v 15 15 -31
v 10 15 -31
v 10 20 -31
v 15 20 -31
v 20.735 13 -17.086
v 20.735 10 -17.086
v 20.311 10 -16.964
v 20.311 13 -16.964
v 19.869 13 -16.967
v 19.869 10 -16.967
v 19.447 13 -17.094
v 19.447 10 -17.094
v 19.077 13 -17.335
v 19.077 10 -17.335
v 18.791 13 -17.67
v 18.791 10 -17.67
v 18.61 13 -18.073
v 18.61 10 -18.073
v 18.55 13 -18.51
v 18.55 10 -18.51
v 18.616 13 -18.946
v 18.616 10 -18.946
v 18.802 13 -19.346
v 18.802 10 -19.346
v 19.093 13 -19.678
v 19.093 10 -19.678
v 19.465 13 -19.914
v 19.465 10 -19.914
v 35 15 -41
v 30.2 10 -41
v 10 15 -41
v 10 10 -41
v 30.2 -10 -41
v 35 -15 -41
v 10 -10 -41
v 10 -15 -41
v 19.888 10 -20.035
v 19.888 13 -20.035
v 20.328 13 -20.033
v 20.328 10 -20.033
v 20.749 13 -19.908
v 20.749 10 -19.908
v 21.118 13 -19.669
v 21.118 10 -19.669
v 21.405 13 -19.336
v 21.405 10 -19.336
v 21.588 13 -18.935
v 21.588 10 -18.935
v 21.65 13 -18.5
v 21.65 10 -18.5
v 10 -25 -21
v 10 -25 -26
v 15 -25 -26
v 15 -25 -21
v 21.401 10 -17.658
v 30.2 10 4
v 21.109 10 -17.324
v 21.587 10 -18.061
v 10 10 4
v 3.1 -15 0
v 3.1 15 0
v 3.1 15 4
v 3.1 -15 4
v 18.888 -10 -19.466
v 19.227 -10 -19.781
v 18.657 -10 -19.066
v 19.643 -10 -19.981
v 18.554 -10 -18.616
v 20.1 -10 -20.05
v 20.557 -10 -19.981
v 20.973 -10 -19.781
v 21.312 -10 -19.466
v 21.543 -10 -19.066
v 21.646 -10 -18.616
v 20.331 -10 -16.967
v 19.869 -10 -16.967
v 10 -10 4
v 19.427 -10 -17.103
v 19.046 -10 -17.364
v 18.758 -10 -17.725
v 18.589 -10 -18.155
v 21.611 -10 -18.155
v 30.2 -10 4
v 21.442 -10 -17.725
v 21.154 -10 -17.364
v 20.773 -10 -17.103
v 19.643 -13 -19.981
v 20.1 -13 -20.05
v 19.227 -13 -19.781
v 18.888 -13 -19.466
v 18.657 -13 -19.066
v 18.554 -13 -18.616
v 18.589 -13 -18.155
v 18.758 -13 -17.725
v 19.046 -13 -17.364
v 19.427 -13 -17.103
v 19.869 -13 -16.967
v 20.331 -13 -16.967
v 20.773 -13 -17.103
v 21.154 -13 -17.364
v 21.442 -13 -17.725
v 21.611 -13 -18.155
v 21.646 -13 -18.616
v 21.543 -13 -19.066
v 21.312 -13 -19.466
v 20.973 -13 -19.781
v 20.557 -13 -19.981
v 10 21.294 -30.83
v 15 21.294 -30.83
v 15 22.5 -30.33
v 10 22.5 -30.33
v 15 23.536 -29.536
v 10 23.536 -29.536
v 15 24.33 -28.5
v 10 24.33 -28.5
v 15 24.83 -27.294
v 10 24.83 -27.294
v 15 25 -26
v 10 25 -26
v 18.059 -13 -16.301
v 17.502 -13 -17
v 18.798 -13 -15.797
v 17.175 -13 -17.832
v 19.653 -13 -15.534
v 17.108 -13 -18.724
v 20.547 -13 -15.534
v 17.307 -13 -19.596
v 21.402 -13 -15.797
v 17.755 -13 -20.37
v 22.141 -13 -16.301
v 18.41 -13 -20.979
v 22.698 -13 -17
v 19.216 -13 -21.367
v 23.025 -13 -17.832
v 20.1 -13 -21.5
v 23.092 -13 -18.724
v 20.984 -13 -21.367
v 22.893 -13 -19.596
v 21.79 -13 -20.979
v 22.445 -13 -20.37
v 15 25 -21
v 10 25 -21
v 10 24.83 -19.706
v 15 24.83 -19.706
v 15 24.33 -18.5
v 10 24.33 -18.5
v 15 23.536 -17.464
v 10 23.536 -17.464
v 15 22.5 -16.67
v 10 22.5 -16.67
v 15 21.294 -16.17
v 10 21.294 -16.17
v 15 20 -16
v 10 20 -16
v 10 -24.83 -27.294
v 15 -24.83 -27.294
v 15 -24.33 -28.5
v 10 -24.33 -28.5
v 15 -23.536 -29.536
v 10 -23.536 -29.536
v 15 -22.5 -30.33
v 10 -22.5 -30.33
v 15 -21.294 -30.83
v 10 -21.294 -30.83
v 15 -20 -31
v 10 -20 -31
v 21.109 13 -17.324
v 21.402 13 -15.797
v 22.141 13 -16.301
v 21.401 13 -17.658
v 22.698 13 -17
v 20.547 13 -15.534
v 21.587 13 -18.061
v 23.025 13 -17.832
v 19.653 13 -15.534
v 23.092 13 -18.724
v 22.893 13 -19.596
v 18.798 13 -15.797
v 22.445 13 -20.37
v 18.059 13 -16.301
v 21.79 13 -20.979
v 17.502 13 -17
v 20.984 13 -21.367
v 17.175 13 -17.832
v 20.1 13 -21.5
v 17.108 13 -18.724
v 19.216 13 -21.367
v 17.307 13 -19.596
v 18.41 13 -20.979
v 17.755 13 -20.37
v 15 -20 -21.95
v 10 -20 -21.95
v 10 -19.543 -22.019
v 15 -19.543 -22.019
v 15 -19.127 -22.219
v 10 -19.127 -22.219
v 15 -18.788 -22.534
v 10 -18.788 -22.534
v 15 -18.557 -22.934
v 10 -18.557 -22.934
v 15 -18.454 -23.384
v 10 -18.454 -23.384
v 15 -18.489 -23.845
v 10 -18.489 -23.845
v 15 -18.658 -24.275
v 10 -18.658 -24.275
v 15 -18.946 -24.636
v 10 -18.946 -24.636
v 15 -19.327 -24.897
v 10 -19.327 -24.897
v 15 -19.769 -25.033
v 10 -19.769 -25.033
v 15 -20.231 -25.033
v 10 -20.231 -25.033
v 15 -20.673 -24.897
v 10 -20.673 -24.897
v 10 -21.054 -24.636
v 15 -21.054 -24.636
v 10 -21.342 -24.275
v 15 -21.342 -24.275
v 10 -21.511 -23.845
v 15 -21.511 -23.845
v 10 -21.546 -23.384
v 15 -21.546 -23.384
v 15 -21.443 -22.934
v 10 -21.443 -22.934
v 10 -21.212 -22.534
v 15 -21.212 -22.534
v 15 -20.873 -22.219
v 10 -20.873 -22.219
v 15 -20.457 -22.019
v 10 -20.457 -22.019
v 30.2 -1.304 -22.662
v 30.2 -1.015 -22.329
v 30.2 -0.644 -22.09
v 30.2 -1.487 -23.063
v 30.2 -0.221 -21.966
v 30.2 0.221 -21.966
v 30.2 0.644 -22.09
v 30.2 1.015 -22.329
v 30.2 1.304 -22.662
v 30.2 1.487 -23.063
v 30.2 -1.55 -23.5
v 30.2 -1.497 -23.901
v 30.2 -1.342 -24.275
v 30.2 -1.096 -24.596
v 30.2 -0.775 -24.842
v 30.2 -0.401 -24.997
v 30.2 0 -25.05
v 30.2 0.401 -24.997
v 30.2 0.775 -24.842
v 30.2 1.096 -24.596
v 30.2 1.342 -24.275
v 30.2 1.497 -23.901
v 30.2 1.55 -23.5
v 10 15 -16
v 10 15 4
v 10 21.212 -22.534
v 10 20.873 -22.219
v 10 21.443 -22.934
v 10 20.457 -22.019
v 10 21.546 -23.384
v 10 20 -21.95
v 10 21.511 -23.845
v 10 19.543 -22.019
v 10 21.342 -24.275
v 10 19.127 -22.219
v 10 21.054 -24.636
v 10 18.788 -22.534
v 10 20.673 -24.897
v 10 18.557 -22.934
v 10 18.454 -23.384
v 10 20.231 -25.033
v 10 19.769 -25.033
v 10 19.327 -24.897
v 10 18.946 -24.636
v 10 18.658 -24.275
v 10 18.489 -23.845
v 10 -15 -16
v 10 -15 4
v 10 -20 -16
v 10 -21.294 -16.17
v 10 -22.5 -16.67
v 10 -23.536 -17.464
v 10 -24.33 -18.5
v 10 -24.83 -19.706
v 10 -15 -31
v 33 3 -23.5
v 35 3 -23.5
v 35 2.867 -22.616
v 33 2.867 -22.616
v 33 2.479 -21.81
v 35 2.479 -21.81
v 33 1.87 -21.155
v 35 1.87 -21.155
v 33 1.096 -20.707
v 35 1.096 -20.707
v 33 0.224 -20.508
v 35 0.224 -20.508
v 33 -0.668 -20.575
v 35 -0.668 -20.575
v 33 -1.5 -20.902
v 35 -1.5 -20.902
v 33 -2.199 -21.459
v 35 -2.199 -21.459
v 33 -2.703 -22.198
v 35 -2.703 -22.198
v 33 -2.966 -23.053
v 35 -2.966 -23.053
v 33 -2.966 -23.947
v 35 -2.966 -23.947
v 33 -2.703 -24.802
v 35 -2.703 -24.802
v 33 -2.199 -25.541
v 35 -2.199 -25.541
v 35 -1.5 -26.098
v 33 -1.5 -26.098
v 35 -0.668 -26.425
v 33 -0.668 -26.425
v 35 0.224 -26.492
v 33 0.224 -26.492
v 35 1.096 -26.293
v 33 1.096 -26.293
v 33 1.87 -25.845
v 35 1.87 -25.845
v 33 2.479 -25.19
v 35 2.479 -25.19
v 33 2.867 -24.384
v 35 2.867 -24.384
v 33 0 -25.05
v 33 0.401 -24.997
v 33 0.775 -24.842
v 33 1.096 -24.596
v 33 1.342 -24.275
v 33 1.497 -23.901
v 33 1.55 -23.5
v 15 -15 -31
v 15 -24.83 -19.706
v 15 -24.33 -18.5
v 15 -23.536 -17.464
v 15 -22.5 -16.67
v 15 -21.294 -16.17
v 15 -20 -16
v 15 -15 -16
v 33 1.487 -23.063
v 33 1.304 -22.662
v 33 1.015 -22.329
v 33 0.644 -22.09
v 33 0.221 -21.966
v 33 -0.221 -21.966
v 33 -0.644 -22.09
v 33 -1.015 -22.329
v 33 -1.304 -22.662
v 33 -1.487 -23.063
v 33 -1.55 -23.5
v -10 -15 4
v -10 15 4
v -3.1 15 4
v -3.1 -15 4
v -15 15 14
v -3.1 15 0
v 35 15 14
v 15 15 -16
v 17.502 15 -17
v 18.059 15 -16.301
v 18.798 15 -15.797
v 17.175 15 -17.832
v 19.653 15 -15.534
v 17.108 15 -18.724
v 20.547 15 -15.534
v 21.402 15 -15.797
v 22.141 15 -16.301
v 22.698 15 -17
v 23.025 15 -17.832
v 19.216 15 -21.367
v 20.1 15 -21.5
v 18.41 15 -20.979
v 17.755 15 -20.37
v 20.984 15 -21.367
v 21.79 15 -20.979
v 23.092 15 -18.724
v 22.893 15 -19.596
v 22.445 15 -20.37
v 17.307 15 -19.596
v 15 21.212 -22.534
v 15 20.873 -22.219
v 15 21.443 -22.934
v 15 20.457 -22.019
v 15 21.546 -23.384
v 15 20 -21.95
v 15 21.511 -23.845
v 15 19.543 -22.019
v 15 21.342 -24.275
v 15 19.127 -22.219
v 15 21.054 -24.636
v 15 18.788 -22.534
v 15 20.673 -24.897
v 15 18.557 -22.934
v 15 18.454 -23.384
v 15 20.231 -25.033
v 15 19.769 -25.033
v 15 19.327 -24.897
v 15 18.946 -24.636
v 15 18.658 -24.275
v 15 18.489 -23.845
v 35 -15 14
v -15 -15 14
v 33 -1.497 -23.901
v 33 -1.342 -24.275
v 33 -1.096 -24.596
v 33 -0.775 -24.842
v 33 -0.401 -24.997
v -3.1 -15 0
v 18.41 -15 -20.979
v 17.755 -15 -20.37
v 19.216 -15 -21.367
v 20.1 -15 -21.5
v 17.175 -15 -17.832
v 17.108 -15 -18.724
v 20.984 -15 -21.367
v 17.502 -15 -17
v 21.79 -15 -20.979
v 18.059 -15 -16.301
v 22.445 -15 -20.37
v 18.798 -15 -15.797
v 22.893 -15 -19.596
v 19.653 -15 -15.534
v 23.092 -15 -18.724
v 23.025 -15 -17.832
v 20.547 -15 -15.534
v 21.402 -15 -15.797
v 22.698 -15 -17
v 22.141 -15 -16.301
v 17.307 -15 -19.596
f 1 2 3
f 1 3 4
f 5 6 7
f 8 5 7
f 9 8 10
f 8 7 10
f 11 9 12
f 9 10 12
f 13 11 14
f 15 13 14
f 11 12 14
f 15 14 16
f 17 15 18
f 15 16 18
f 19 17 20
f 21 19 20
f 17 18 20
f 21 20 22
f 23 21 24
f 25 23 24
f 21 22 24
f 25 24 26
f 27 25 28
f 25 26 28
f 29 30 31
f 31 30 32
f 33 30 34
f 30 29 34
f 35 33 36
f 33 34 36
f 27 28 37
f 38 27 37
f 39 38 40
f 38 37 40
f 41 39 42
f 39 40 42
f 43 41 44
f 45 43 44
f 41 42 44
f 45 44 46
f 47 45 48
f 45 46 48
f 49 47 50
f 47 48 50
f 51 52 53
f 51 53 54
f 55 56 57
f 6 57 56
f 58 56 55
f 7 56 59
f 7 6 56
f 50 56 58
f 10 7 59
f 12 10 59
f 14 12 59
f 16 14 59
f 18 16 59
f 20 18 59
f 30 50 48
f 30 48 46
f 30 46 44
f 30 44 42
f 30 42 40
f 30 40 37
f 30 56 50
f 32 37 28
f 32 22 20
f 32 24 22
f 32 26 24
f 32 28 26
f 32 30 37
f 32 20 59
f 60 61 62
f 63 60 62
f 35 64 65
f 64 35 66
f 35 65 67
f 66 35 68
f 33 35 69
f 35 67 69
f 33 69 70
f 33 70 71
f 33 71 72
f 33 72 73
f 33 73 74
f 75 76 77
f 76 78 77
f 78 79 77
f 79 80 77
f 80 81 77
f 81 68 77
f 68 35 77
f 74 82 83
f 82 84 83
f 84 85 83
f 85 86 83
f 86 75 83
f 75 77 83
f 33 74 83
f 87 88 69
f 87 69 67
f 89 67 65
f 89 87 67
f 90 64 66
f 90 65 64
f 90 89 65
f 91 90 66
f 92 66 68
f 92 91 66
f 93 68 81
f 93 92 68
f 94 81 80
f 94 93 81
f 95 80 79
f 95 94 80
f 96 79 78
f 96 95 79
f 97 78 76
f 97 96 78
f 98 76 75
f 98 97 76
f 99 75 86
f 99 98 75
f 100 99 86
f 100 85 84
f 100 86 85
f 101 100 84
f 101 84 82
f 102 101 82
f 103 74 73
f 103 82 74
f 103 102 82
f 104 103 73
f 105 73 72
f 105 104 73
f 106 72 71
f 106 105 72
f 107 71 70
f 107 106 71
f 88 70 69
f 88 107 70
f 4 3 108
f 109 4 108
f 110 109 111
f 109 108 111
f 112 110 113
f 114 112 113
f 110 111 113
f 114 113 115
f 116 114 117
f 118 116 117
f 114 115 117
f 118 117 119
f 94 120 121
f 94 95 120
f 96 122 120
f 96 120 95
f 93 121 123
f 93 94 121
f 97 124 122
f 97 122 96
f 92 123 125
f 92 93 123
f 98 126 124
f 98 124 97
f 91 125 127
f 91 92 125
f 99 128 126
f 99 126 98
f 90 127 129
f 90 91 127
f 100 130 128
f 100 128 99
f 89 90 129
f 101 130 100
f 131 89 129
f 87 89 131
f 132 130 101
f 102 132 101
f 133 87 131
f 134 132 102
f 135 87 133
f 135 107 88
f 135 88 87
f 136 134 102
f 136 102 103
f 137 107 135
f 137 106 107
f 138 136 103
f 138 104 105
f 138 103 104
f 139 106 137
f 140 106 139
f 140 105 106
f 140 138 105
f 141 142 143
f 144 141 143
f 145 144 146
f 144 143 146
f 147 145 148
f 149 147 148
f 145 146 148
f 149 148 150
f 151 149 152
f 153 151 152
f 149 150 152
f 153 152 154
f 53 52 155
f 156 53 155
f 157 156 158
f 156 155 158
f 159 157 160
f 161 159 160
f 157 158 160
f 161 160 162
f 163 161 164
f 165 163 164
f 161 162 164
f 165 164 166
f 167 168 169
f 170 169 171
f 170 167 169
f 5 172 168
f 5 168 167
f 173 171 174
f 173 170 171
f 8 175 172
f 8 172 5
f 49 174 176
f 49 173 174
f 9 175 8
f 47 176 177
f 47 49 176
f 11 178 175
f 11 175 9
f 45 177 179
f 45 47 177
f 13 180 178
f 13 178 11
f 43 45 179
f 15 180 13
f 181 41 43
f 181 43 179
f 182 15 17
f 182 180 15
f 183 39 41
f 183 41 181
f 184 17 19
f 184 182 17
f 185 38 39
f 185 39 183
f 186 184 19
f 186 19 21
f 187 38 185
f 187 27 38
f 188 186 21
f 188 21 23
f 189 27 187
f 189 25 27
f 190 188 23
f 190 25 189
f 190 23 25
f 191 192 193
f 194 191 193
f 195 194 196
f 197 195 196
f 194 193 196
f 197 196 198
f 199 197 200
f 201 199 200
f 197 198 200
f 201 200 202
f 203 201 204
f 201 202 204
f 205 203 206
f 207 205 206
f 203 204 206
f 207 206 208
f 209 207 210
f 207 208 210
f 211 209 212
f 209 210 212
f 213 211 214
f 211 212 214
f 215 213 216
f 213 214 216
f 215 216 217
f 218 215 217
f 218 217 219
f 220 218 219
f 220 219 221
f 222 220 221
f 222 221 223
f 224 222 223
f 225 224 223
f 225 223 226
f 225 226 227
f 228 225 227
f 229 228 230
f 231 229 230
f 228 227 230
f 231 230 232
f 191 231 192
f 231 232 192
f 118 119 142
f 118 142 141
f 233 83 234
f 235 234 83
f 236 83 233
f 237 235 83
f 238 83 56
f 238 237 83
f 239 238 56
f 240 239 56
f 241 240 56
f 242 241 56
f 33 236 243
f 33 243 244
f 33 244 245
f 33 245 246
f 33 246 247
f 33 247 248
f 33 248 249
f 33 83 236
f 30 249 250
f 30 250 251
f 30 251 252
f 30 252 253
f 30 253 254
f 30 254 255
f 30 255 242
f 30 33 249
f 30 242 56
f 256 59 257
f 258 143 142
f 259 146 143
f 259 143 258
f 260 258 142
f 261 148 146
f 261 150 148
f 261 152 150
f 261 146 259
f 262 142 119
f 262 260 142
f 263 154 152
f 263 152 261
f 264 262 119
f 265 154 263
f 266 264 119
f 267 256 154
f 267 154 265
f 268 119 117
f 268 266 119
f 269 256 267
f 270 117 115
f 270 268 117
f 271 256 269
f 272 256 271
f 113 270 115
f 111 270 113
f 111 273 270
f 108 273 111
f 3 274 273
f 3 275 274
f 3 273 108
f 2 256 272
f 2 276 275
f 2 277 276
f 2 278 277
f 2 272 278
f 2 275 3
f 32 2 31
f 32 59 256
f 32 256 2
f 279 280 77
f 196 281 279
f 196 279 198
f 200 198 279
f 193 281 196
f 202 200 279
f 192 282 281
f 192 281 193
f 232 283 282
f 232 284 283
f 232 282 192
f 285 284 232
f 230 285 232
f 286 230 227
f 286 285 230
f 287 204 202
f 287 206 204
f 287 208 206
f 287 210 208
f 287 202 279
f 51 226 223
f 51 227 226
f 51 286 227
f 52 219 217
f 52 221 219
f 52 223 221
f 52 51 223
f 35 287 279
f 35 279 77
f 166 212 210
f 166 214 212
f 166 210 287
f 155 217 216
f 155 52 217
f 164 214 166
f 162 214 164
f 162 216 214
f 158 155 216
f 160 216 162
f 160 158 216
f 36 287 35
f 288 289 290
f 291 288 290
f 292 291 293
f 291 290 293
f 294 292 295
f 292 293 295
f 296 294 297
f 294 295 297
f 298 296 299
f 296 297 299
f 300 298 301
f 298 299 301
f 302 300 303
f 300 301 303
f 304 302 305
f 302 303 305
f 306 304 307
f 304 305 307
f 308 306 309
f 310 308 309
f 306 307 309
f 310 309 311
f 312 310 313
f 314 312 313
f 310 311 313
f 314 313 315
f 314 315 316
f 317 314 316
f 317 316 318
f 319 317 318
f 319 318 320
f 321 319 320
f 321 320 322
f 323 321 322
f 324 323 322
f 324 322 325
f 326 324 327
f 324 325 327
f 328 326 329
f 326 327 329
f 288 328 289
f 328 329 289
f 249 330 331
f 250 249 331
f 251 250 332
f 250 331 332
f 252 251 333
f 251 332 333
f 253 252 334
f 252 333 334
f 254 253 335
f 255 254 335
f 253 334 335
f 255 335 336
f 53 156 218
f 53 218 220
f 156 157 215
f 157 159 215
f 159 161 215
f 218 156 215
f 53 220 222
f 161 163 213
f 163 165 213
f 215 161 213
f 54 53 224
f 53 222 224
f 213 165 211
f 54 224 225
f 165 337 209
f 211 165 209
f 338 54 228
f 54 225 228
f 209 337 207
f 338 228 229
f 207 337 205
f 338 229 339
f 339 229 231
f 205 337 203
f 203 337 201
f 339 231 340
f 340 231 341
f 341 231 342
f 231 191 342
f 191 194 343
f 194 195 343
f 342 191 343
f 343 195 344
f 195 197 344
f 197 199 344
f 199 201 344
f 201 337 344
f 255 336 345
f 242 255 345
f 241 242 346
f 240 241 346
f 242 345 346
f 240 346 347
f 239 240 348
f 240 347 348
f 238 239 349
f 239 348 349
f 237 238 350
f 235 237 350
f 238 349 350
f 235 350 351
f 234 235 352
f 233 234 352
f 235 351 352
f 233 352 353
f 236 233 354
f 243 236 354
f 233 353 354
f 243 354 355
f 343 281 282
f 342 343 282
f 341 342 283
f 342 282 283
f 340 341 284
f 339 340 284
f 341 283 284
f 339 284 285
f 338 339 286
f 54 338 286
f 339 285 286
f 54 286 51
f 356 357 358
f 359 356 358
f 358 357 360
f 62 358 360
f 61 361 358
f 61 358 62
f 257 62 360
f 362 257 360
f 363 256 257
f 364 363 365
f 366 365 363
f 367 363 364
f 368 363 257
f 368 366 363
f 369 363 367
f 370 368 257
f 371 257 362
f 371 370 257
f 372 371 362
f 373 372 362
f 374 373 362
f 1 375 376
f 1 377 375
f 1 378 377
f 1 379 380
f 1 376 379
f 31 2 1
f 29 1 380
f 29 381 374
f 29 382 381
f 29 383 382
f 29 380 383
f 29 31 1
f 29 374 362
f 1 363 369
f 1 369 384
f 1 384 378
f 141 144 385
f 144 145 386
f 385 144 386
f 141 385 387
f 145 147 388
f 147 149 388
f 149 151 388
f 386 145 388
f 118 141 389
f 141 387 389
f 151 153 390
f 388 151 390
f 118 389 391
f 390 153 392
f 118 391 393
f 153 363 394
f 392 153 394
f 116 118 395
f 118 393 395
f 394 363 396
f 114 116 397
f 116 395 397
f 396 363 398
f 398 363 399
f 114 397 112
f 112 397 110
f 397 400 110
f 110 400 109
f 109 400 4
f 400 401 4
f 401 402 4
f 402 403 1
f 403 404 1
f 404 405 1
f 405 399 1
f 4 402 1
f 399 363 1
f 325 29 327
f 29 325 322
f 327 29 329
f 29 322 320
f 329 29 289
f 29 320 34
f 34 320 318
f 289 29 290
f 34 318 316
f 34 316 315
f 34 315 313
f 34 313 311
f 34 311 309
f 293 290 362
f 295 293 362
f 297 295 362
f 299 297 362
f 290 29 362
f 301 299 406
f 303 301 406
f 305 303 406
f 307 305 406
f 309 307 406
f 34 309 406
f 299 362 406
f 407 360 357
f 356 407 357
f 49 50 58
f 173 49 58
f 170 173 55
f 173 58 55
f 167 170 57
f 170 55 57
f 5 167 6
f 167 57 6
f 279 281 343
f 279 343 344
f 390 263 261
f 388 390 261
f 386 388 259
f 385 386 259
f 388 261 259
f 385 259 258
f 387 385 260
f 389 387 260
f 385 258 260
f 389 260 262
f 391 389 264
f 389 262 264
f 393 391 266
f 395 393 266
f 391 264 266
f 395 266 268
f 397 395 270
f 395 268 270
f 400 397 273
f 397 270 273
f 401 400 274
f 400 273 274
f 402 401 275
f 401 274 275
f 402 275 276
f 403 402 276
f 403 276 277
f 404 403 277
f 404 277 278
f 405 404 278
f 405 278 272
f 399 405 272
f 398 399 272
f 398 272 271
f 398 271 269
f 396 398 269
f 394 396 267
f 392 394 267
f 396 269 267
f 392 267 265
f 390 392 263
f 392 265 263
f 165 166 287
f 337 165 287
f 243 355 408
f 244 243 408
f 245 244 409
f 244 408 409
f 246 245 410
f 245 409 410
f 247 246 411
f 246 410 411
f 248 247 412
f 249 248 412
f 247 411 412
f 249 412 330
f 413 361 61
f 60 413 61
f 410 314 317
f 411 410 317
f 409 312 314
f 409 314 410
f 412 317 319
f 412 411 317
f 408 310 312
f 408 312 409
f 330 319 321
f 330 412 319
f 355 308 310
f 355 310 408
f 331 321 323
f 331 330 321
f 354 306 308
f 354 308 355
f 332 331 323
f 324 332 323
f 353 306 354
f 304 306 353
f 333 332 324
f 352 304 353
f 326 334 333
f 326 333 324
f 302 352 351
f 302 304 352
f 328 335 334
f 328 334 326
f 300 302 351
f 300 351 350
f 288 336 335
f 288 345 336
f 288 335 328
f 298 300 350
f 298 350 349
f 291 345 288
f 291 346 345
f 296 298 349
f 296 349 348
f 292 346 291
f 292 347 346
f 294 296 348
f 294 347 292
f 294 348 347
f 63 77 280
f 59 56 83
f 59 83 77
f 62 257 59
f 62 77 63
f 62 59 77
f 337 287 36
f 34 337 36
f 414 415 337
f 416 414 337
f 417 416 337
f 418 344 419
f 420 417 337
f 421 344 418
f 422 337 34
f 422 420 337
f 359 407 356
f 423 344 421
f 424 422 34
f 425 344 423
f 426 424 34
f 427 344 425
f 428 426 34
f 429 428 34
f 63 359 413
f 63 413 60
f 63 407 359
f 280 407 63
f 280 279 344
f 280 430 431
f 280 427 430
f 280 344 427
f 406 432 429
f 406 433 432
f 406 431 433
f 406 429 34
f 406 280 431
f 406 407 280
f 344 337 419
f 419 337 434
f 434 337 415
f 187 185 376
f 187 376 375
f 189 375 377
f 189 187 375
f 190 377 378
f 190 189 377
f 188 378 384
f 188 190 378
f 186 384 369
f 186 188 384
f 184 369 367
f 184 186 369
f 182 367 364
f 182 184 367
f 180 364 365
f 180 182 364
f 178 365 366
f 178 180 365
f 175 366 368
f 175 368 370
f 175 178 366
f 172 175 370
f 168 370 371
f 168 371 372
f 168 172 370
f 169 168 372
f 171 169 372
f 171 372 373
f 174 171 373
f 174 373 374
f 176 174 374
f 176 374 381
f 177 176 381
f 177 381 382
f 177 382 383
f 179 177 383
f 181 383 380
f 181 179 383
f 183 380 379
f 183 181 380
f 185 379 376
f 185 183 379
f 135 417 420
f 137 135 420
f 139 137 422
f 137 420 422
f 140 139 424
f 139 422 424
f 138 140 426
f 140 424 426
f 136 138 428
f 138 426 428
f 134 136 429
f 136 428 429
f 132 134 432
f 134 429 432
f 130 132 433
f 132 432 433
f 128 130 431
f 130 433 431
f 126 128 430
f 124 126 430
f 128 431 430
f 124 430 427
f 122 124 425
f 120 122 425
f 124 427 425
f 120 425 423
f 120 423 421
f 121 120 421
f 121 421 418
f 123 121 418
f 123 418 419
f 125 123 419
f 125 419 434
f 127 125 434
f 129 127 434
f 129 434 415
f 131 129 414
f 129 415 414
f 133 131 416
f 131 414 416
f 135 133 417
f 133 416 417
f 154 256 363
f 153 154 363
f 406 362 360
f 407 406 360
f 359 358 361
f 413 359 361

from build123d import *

# Parameters (mm, degrees)
EXTRUDE_1_DEPTH      = 14
CUT_EXTRUDE_1_DEPTH  = 44
SKETCH_8_W           = 5
SKETCH_8_H           = 44
CUT_EXTRUDE_2_DEPTH  = 10
SKETCH_9_W           = 25
SKETCH_9_H           = 44
EXTRUDE_2_DEPTH      = 10
SKETCH_10_W          = 50
SKETCH_10_H          = 7
CUT_EXTRUDE_3_DEPTH  = 10
SKETCH_11_W          = 6.2
SKETCH_11_H          = 7
CUT_EXTRUDE_4_DEPTH  = 10
SKETCH_12_W          = 5
SKETCH_12_H          = 5
SKETCH_12_W_2        = 20
SKETCH_12_H_2        = 20
EXTRUDE_3_DEPTH      = 45
SKETCH_13_W          = 5
SKETCH_13_H          = 7.5
EXTRUDE_4_DEPTH      = 10
SKETCH_14_W          = 15
SKETCH_14_H          = 10
EXTRUDE_5_DEPTH      = 5
SKETCH_15_R          = 1.55
CUT_EXTRUDE_5_DEPTH  = 5
CUT_EXTRUDE_6_DEPTH  = 5
CUT_EXTRUDE_7_DEPTH  = 5
EXTRUDE_6_DEPTH      = 5
EXTRUDE_START        = -5
EXTRUDE_7_DEPTH      = 5
SKETCH_20_W          = 0.2
SKETCH_20_H          = 20
CUT_EXTRUDE_8_DEPTH  = 45
CUT_EXTRUDE_START    = -100
CUT_EXTRUDE_9_DEPTH  = 100
CUT_EXTRUDE_10_DEPTH = 100
SKETCH_24_R          = 1.55
CUT_EXTRUDE_11_DEPTH = 100
SKETCH_25_R          = 3
SKETCH_25_R_2        = 1.55
CUT_EXTRUDE_12_DEPTH = 2
CUT_EXTRUDE_START_2  = -2
SKETCH_26_R          = 3
CUT_EXTRUDE_13_DEPTH = 2
CUT_EXTRUDE_14_DEPTH = 5
SKETCH_28_R          = 3
CUT_EXTRUDE_15_DEPTH = 2


with BuildPart() as part:
    # 草图1 → 凸台-拉伸1 (new body)
    with BuildSketch(Plane.XY):
        Polygon((-15, 22), (-15, -22), (15, -22), (15, 22), (0, 22), align=None)
    extrude(amount=EXTRUDE_1_DEPTH)

    # 草图2 → 切除-拉伸1 (cut)
    with BuildSketch(Plane(origin=(0, 22, 0), x_dir=(1, 0, 0), z_dir=(0, 1, 0))):
        Polygon((-15, 0), (-15, -14), (-10, -4), (-3.1, -4), (-3.1, 0), align=None)
        Polygon((3.1, -4), (10, -4), (15, -14), (15, 0), (3.1, 0), align=None)
    extrude(amount=-CUT_EXTRUDE_1_DEPTH, mode=Mode.SUBTRACT)

    # 草图8 → 切除-拉伸2 (cut)
    with BuildSketch(Plane(origin=(0, 0, 4), x_dir=(-1, 0, 0), z_dir=(0, 0, -1))):
        with Locations((-12.5, 0)):
            Rectangle(SKETCH_8_W, SKETCH_8_H)
    extrude(amount=-CUT_EXTRUDE_2_DEPTH, mode=Mode.SUBTRACT)

    # 草图9 → 凸台-拉伸2 (add)
    with BuildSketch(Plane(origin=(0, 0, 4), x_dir=(-1, 0, 0), z_dir=(0, 0, -1))):
        with Locations((-22.5, 0)):
            Rectangle(SKETCH_9_W, SKETCH_9_H)
    extrude(amount=-EXTRUDE_2_DEPTH)

    # 草图10 → 切除-拉伸3 (cut)
    with BuildSketch(Plane(origin=(0, 0, 4), x_dir=(-1, 0, 0), z_dir=(0, 0, -1))):
        with Locations((-10, -18.5)):
            Rectangle(SKETCH_10_W, SKETCH_10_H)
        with Locations((-10, 18.5)):
            Rectangle(SKETCH_10_W, SKETCH_10_H)
    extrude(amount=-CUT_EXTRUDE_3_DEPTH, mode=Mode.SUBTRACT)

    # 草图11 → 切除-拉伸4 (cut)
    with BuildSketch(Plane(origin=(0, 0, 0), x_dir=(-1, 0, 0), z_dir=(0, 0, -1))):
        with Locations((0, 18.5)):
            Rectangle(SKETCH_11_W, SKETCH_11_H)
        with Locations((0, -18.5)):
            Rectangle(SKETCH_11_W, SKETCH_11_H)
    extrude(amount=-CUT_EXTRUDE_4_DEPTH, mode=Mode.SUBTRACT)

    # 草图12 → 凸台-拉伸3 (add)
    with BuildSketch(Plane(origin=(0, 0, 4), x_dir=(-1, 0, 0), z_dir=(0, 0, -1))):
        with Locations((-32.5, 12.5)):
            Rectangle(SKETCH_12_W, SKETCH_12_H)
        with Locations((-20, 12.5)):
            Rectangle(SKETCH_12_W_2, SKETCH_12_H)
        with Locations((-32.5, 0)):
            Rectangle(SKETCH_12_W, SKETCH_12_H_2)
        with Locations((-32.5, -12.5)):
            Rectangle(SKETCH_12_W, SKETCH_12_H)
        with Locations((-20, -12.5)):
            Rectangle(SKETCH_12_W_2, SKETCH_12_H)
    extrude(amount=EXTRUDE_3_DEPTH)

    # 草图13 → 凸台-拉伸4 (add)
    with BuildSketch(Plane(origin=(0, 15, 0), x_dir=(1, 0, 0), z_dir=(0, 1, 0))):
        with Locations((12.5, 27.25)):
            Rectangle(SKETCH_13_W, SKETCH_13_H)
        with Locations((12.5, 19.75)):
            Rectangle(SKETCH_13_W, SKETCH_13_H)
    extrude(amount=EXTRUDE_4_DEPTH)

    # 草图14 → 凸台-拉伸5 (add)
    with BuildSketch(Plane.ZY.offset(-10)):
        with Locations((-23.5, -20)):
            Rectangle(SKETCH_14_W, SKETCH_14_H)
    extrude(amount=-EXTRUDE_5_DEPTH)

    # 草图15 → 切除-拉伸5 (cut)
    with BuildSketch(Plane.ZY.offset(-10)):
        with Locations((-23.5, 20)):
            Circle(SKETCH_15_R)
        with Locations((-23.5, -20)):
            Circle(SKETCH_15_R)
    extrude(amount=-CUT_EXTRUDE_5_DEPTH, mode=Mode.SUBTRACT)

    # 草图16 → 切除-拉伸6 (cut)
    with BuildSketch(Plane.ZY.offset(-10)):
        with BuildLine():
            Line((-31, 25), (-31, 20))
            ThreePointArc((-31, 20), (-29.535533906, 23.535533906), (-26, 25))
            Line((-26, 25), (-31, 25))
        make_face()
        with BuildLine():
            Line((-16, 25), (-21, 25))
            ThreePointArc((-21, 25), (-17.464466094, 23.535533906), (-16, 20))
            Line((-16, 20), (-16, 25))
        make_face()
    extrude(amount=-CUT_EXTRUDE_6_DEPTH, mode=Mode.SUBTRACT)

    # 草图17 → 切除-拉伸7 (cut)
    with BuildSketch(Plane.ZY.offset(-10)):
        with BuildLine():
            ThreePointArc((-26, -25), (-29.535533906, -23.535533906), (-31, -20))
            Line((-31, -20), (-31, -25))
            Line((-31, -25), (-26, -25))
        make_face()
        with BuildLine():
            ThreePointArc((-16, -20), (-17.464466094, -23.535533906), (-21, -25))
            Line((-21, -25), (-16, -25))
            Line((-16, -25), (-16, -20))
        make_face()
    extrude(amount=-CUT_EXTRUDE_7_DEPTH, mode=Mode.SUBTRACT)

    # 草图18 → 凸台-拉伸6 (add)
    with BuildSketch(Plane.XZ.offset(15)):
        with BuildLine():
            Line((10, -41), (10, -31))
            ThreePointArc((10, -31), (7.071067812, -38.071067812), (0, -41))
            Line((0, -41), (10, -41))
        make_face()
    extrude(amount=-EXTRUDE_6_DEPTH)

    # 草图19 → 凸台-拉伸7 (add)
    with BuildSketch(Plane(origin=(0, 15, 0), x_dir=(1, 0, 0), z_dir=(0, 1, 0)).offset(EXTRUDE_START)):
        with BuildLine():
            Line((10, 41), (0, 41))
            ThreePointArc((0, 41), (7.071067812, 38.071067812), (10, 31))
            Line((10, 31), (10, 41))
        make_face()
    extrude(amount=EXTRUDE_7_DEPTH)

    # 草图20 → 切除-拉伸8 (cut)
    with BuildSketch(Plane(origin=(0, 0, -41), x_dir=(-1, 0, 0), z_dir=(0, 0, -1))):
        with Locations((-30.1, 0)):
            Rectangle(SKETCH_20_W, SKETCH_20_H)
    extrude(amount=-CUT_EXTRUDE_8_DEPTH, mode=Mode.SUBTRACT)

    # 草图21 → 切除-拉伸9 (cut)
    with BuildSketch(Plane(origin=(0, 15, 0), x_dir=(1, 0, 0), z_dir=(0, 1, 0)).offset(CUT_EXTRUDE_START)):
        with BuildLine():
            Line((10, 41), (0, 41))
            ThreePointArc((0, 41), (7.071067812, 38.071067812), (10, 31))
            Line((10, 31), (10, 41))
        make_face()
    extrude(amount=CUT_EXTRUDE_9_DEPTH, mode=Mode.SUBTRACT)

    # 草图23 → 切除-拉伸10 (cut)
    with BuildSketch(Plane.XZ.offset(-10)):
        with BuildLine():
            ThreePointArc((21.65, -18.5), (21.401225478, -17.657793223), (20.73475838, -17.085934302))
            Line((20.73475838, -17.085934302), (19.46524162, -19.914065698))
            ThreePointArc((19.46524162, -19.914065698), (20.942206777, -19.801225478), (21.65, -18.5))
        make_face()
        with BuildLine():
            Line((19.46524162, -19.914065698), (20.73475838, -17.085934302))
            ThreePointArc((20.73475838, -17.085934302), (18.685934302, -17.86524162), (19.46524162, -19.914065698))
        make_face()
    extrude(amount=-CUT_EXTRUDE_10_DEPTH, mode=Mode.SUBTRACT)

    # 草图24 → 切除-拉伸11 (cut)
    with BuildSketch(Plane(origin=(0, 15, 0), x_dir=(1, 0, 0), z_dir=(0, 1, 0)).offset(CUT_EXTRUDE_START)):
        with Locations(Location((20.1, 18.5, 0), (0, 0, 90))):
            Circle(SKETCH_24_R)
    extrude(amount=CUT_EXTRUDE_11_DEPTH, mode=Mode.SUBTRACT)

    # 草图25 → 切除-拉伸12 (cut)
    with BuildSketch(Plane.XZ.offset(15)):
        with Locations(Location((20.1, -18.5, 0), (0, 0, 270))):
            Circle(SKETCH_25_R)
        with Locations(Location((20.1, -18.5, 0), (0, 0, 90))):
            Circle(SKETCH_25_R_2, mode=Mode.SUBTRACT)
    extrude(amount=-CUT_EXTRUDE_12_DEPTH, mode=Mode.SUBTRACT)

    # 草图26 → 切除-拉伸13 (cut)
    with BuildSketch(Plane(origin=(0, 15, 0), x_dir=(1, 0, 0), z_dir=(0, 1, 0)).offset(CUT_EXTRUDE_START_2)):
        with Locations(Location((20.1, 18.5, 0), (0, 0, 90))):
            Circle(SKETCH_26_R)
    extrude(amount=CUT_EXTRUDE_13_DEPTH, mode=Mode.SUBTRACT)

    # 草图27 → 切除-拉伸14 (cut)
    with BuildSketch(Plane(origin=(35, 0, 0), x_dir=(0, 0, -1), z_dir=(1, 0, 0))):
        with BuildLine():
            ThreePointArc((25.05, 0), (24.596015511, 1.096015511), (23.5, 1.55))
            Line((23.5, 1.55), (23.5, 0))
            Line((23.5, 0), (25.05, 0))
        make_face()
        with BuildLine():
            Line((25.05, 0), (23.5, 0))
            Line((23.5, 0), (23.5, -1.55))
            ThreePointArc((23.5, -1.55), (24.596015511, -1.096015511), (25.05, 0))
        make_face()
        with BuildLine():
            Line((23.5, 0), (23.5, 1.55))
            ThreePointArc((23.5, 1.55), (21.95, 0), (23.5, -1.55))
            Line((23.5, -1.55), (23.5, 0))
        make_face()
    extrude(amount=-CUT_EXTRUDE_14_DEPTH, mode=Mode.SUBTRACT)

    # 草图28 → 切除-拉伸15 (cut)
    with BuildSketch(Plane(origin=(35, 0, 0), x_dir=(0, 0, -1), z_dir=(1, 0, 0))):
        with Locations(Location((23.5, 0, 0), (0, 0, 90))):
            Circle(SKETCH_28_R)
    extrude(amount=-CUT_EXTRUDE_15_DEPTH, mode=Mode.SUBTRACT)


solid = part.part
